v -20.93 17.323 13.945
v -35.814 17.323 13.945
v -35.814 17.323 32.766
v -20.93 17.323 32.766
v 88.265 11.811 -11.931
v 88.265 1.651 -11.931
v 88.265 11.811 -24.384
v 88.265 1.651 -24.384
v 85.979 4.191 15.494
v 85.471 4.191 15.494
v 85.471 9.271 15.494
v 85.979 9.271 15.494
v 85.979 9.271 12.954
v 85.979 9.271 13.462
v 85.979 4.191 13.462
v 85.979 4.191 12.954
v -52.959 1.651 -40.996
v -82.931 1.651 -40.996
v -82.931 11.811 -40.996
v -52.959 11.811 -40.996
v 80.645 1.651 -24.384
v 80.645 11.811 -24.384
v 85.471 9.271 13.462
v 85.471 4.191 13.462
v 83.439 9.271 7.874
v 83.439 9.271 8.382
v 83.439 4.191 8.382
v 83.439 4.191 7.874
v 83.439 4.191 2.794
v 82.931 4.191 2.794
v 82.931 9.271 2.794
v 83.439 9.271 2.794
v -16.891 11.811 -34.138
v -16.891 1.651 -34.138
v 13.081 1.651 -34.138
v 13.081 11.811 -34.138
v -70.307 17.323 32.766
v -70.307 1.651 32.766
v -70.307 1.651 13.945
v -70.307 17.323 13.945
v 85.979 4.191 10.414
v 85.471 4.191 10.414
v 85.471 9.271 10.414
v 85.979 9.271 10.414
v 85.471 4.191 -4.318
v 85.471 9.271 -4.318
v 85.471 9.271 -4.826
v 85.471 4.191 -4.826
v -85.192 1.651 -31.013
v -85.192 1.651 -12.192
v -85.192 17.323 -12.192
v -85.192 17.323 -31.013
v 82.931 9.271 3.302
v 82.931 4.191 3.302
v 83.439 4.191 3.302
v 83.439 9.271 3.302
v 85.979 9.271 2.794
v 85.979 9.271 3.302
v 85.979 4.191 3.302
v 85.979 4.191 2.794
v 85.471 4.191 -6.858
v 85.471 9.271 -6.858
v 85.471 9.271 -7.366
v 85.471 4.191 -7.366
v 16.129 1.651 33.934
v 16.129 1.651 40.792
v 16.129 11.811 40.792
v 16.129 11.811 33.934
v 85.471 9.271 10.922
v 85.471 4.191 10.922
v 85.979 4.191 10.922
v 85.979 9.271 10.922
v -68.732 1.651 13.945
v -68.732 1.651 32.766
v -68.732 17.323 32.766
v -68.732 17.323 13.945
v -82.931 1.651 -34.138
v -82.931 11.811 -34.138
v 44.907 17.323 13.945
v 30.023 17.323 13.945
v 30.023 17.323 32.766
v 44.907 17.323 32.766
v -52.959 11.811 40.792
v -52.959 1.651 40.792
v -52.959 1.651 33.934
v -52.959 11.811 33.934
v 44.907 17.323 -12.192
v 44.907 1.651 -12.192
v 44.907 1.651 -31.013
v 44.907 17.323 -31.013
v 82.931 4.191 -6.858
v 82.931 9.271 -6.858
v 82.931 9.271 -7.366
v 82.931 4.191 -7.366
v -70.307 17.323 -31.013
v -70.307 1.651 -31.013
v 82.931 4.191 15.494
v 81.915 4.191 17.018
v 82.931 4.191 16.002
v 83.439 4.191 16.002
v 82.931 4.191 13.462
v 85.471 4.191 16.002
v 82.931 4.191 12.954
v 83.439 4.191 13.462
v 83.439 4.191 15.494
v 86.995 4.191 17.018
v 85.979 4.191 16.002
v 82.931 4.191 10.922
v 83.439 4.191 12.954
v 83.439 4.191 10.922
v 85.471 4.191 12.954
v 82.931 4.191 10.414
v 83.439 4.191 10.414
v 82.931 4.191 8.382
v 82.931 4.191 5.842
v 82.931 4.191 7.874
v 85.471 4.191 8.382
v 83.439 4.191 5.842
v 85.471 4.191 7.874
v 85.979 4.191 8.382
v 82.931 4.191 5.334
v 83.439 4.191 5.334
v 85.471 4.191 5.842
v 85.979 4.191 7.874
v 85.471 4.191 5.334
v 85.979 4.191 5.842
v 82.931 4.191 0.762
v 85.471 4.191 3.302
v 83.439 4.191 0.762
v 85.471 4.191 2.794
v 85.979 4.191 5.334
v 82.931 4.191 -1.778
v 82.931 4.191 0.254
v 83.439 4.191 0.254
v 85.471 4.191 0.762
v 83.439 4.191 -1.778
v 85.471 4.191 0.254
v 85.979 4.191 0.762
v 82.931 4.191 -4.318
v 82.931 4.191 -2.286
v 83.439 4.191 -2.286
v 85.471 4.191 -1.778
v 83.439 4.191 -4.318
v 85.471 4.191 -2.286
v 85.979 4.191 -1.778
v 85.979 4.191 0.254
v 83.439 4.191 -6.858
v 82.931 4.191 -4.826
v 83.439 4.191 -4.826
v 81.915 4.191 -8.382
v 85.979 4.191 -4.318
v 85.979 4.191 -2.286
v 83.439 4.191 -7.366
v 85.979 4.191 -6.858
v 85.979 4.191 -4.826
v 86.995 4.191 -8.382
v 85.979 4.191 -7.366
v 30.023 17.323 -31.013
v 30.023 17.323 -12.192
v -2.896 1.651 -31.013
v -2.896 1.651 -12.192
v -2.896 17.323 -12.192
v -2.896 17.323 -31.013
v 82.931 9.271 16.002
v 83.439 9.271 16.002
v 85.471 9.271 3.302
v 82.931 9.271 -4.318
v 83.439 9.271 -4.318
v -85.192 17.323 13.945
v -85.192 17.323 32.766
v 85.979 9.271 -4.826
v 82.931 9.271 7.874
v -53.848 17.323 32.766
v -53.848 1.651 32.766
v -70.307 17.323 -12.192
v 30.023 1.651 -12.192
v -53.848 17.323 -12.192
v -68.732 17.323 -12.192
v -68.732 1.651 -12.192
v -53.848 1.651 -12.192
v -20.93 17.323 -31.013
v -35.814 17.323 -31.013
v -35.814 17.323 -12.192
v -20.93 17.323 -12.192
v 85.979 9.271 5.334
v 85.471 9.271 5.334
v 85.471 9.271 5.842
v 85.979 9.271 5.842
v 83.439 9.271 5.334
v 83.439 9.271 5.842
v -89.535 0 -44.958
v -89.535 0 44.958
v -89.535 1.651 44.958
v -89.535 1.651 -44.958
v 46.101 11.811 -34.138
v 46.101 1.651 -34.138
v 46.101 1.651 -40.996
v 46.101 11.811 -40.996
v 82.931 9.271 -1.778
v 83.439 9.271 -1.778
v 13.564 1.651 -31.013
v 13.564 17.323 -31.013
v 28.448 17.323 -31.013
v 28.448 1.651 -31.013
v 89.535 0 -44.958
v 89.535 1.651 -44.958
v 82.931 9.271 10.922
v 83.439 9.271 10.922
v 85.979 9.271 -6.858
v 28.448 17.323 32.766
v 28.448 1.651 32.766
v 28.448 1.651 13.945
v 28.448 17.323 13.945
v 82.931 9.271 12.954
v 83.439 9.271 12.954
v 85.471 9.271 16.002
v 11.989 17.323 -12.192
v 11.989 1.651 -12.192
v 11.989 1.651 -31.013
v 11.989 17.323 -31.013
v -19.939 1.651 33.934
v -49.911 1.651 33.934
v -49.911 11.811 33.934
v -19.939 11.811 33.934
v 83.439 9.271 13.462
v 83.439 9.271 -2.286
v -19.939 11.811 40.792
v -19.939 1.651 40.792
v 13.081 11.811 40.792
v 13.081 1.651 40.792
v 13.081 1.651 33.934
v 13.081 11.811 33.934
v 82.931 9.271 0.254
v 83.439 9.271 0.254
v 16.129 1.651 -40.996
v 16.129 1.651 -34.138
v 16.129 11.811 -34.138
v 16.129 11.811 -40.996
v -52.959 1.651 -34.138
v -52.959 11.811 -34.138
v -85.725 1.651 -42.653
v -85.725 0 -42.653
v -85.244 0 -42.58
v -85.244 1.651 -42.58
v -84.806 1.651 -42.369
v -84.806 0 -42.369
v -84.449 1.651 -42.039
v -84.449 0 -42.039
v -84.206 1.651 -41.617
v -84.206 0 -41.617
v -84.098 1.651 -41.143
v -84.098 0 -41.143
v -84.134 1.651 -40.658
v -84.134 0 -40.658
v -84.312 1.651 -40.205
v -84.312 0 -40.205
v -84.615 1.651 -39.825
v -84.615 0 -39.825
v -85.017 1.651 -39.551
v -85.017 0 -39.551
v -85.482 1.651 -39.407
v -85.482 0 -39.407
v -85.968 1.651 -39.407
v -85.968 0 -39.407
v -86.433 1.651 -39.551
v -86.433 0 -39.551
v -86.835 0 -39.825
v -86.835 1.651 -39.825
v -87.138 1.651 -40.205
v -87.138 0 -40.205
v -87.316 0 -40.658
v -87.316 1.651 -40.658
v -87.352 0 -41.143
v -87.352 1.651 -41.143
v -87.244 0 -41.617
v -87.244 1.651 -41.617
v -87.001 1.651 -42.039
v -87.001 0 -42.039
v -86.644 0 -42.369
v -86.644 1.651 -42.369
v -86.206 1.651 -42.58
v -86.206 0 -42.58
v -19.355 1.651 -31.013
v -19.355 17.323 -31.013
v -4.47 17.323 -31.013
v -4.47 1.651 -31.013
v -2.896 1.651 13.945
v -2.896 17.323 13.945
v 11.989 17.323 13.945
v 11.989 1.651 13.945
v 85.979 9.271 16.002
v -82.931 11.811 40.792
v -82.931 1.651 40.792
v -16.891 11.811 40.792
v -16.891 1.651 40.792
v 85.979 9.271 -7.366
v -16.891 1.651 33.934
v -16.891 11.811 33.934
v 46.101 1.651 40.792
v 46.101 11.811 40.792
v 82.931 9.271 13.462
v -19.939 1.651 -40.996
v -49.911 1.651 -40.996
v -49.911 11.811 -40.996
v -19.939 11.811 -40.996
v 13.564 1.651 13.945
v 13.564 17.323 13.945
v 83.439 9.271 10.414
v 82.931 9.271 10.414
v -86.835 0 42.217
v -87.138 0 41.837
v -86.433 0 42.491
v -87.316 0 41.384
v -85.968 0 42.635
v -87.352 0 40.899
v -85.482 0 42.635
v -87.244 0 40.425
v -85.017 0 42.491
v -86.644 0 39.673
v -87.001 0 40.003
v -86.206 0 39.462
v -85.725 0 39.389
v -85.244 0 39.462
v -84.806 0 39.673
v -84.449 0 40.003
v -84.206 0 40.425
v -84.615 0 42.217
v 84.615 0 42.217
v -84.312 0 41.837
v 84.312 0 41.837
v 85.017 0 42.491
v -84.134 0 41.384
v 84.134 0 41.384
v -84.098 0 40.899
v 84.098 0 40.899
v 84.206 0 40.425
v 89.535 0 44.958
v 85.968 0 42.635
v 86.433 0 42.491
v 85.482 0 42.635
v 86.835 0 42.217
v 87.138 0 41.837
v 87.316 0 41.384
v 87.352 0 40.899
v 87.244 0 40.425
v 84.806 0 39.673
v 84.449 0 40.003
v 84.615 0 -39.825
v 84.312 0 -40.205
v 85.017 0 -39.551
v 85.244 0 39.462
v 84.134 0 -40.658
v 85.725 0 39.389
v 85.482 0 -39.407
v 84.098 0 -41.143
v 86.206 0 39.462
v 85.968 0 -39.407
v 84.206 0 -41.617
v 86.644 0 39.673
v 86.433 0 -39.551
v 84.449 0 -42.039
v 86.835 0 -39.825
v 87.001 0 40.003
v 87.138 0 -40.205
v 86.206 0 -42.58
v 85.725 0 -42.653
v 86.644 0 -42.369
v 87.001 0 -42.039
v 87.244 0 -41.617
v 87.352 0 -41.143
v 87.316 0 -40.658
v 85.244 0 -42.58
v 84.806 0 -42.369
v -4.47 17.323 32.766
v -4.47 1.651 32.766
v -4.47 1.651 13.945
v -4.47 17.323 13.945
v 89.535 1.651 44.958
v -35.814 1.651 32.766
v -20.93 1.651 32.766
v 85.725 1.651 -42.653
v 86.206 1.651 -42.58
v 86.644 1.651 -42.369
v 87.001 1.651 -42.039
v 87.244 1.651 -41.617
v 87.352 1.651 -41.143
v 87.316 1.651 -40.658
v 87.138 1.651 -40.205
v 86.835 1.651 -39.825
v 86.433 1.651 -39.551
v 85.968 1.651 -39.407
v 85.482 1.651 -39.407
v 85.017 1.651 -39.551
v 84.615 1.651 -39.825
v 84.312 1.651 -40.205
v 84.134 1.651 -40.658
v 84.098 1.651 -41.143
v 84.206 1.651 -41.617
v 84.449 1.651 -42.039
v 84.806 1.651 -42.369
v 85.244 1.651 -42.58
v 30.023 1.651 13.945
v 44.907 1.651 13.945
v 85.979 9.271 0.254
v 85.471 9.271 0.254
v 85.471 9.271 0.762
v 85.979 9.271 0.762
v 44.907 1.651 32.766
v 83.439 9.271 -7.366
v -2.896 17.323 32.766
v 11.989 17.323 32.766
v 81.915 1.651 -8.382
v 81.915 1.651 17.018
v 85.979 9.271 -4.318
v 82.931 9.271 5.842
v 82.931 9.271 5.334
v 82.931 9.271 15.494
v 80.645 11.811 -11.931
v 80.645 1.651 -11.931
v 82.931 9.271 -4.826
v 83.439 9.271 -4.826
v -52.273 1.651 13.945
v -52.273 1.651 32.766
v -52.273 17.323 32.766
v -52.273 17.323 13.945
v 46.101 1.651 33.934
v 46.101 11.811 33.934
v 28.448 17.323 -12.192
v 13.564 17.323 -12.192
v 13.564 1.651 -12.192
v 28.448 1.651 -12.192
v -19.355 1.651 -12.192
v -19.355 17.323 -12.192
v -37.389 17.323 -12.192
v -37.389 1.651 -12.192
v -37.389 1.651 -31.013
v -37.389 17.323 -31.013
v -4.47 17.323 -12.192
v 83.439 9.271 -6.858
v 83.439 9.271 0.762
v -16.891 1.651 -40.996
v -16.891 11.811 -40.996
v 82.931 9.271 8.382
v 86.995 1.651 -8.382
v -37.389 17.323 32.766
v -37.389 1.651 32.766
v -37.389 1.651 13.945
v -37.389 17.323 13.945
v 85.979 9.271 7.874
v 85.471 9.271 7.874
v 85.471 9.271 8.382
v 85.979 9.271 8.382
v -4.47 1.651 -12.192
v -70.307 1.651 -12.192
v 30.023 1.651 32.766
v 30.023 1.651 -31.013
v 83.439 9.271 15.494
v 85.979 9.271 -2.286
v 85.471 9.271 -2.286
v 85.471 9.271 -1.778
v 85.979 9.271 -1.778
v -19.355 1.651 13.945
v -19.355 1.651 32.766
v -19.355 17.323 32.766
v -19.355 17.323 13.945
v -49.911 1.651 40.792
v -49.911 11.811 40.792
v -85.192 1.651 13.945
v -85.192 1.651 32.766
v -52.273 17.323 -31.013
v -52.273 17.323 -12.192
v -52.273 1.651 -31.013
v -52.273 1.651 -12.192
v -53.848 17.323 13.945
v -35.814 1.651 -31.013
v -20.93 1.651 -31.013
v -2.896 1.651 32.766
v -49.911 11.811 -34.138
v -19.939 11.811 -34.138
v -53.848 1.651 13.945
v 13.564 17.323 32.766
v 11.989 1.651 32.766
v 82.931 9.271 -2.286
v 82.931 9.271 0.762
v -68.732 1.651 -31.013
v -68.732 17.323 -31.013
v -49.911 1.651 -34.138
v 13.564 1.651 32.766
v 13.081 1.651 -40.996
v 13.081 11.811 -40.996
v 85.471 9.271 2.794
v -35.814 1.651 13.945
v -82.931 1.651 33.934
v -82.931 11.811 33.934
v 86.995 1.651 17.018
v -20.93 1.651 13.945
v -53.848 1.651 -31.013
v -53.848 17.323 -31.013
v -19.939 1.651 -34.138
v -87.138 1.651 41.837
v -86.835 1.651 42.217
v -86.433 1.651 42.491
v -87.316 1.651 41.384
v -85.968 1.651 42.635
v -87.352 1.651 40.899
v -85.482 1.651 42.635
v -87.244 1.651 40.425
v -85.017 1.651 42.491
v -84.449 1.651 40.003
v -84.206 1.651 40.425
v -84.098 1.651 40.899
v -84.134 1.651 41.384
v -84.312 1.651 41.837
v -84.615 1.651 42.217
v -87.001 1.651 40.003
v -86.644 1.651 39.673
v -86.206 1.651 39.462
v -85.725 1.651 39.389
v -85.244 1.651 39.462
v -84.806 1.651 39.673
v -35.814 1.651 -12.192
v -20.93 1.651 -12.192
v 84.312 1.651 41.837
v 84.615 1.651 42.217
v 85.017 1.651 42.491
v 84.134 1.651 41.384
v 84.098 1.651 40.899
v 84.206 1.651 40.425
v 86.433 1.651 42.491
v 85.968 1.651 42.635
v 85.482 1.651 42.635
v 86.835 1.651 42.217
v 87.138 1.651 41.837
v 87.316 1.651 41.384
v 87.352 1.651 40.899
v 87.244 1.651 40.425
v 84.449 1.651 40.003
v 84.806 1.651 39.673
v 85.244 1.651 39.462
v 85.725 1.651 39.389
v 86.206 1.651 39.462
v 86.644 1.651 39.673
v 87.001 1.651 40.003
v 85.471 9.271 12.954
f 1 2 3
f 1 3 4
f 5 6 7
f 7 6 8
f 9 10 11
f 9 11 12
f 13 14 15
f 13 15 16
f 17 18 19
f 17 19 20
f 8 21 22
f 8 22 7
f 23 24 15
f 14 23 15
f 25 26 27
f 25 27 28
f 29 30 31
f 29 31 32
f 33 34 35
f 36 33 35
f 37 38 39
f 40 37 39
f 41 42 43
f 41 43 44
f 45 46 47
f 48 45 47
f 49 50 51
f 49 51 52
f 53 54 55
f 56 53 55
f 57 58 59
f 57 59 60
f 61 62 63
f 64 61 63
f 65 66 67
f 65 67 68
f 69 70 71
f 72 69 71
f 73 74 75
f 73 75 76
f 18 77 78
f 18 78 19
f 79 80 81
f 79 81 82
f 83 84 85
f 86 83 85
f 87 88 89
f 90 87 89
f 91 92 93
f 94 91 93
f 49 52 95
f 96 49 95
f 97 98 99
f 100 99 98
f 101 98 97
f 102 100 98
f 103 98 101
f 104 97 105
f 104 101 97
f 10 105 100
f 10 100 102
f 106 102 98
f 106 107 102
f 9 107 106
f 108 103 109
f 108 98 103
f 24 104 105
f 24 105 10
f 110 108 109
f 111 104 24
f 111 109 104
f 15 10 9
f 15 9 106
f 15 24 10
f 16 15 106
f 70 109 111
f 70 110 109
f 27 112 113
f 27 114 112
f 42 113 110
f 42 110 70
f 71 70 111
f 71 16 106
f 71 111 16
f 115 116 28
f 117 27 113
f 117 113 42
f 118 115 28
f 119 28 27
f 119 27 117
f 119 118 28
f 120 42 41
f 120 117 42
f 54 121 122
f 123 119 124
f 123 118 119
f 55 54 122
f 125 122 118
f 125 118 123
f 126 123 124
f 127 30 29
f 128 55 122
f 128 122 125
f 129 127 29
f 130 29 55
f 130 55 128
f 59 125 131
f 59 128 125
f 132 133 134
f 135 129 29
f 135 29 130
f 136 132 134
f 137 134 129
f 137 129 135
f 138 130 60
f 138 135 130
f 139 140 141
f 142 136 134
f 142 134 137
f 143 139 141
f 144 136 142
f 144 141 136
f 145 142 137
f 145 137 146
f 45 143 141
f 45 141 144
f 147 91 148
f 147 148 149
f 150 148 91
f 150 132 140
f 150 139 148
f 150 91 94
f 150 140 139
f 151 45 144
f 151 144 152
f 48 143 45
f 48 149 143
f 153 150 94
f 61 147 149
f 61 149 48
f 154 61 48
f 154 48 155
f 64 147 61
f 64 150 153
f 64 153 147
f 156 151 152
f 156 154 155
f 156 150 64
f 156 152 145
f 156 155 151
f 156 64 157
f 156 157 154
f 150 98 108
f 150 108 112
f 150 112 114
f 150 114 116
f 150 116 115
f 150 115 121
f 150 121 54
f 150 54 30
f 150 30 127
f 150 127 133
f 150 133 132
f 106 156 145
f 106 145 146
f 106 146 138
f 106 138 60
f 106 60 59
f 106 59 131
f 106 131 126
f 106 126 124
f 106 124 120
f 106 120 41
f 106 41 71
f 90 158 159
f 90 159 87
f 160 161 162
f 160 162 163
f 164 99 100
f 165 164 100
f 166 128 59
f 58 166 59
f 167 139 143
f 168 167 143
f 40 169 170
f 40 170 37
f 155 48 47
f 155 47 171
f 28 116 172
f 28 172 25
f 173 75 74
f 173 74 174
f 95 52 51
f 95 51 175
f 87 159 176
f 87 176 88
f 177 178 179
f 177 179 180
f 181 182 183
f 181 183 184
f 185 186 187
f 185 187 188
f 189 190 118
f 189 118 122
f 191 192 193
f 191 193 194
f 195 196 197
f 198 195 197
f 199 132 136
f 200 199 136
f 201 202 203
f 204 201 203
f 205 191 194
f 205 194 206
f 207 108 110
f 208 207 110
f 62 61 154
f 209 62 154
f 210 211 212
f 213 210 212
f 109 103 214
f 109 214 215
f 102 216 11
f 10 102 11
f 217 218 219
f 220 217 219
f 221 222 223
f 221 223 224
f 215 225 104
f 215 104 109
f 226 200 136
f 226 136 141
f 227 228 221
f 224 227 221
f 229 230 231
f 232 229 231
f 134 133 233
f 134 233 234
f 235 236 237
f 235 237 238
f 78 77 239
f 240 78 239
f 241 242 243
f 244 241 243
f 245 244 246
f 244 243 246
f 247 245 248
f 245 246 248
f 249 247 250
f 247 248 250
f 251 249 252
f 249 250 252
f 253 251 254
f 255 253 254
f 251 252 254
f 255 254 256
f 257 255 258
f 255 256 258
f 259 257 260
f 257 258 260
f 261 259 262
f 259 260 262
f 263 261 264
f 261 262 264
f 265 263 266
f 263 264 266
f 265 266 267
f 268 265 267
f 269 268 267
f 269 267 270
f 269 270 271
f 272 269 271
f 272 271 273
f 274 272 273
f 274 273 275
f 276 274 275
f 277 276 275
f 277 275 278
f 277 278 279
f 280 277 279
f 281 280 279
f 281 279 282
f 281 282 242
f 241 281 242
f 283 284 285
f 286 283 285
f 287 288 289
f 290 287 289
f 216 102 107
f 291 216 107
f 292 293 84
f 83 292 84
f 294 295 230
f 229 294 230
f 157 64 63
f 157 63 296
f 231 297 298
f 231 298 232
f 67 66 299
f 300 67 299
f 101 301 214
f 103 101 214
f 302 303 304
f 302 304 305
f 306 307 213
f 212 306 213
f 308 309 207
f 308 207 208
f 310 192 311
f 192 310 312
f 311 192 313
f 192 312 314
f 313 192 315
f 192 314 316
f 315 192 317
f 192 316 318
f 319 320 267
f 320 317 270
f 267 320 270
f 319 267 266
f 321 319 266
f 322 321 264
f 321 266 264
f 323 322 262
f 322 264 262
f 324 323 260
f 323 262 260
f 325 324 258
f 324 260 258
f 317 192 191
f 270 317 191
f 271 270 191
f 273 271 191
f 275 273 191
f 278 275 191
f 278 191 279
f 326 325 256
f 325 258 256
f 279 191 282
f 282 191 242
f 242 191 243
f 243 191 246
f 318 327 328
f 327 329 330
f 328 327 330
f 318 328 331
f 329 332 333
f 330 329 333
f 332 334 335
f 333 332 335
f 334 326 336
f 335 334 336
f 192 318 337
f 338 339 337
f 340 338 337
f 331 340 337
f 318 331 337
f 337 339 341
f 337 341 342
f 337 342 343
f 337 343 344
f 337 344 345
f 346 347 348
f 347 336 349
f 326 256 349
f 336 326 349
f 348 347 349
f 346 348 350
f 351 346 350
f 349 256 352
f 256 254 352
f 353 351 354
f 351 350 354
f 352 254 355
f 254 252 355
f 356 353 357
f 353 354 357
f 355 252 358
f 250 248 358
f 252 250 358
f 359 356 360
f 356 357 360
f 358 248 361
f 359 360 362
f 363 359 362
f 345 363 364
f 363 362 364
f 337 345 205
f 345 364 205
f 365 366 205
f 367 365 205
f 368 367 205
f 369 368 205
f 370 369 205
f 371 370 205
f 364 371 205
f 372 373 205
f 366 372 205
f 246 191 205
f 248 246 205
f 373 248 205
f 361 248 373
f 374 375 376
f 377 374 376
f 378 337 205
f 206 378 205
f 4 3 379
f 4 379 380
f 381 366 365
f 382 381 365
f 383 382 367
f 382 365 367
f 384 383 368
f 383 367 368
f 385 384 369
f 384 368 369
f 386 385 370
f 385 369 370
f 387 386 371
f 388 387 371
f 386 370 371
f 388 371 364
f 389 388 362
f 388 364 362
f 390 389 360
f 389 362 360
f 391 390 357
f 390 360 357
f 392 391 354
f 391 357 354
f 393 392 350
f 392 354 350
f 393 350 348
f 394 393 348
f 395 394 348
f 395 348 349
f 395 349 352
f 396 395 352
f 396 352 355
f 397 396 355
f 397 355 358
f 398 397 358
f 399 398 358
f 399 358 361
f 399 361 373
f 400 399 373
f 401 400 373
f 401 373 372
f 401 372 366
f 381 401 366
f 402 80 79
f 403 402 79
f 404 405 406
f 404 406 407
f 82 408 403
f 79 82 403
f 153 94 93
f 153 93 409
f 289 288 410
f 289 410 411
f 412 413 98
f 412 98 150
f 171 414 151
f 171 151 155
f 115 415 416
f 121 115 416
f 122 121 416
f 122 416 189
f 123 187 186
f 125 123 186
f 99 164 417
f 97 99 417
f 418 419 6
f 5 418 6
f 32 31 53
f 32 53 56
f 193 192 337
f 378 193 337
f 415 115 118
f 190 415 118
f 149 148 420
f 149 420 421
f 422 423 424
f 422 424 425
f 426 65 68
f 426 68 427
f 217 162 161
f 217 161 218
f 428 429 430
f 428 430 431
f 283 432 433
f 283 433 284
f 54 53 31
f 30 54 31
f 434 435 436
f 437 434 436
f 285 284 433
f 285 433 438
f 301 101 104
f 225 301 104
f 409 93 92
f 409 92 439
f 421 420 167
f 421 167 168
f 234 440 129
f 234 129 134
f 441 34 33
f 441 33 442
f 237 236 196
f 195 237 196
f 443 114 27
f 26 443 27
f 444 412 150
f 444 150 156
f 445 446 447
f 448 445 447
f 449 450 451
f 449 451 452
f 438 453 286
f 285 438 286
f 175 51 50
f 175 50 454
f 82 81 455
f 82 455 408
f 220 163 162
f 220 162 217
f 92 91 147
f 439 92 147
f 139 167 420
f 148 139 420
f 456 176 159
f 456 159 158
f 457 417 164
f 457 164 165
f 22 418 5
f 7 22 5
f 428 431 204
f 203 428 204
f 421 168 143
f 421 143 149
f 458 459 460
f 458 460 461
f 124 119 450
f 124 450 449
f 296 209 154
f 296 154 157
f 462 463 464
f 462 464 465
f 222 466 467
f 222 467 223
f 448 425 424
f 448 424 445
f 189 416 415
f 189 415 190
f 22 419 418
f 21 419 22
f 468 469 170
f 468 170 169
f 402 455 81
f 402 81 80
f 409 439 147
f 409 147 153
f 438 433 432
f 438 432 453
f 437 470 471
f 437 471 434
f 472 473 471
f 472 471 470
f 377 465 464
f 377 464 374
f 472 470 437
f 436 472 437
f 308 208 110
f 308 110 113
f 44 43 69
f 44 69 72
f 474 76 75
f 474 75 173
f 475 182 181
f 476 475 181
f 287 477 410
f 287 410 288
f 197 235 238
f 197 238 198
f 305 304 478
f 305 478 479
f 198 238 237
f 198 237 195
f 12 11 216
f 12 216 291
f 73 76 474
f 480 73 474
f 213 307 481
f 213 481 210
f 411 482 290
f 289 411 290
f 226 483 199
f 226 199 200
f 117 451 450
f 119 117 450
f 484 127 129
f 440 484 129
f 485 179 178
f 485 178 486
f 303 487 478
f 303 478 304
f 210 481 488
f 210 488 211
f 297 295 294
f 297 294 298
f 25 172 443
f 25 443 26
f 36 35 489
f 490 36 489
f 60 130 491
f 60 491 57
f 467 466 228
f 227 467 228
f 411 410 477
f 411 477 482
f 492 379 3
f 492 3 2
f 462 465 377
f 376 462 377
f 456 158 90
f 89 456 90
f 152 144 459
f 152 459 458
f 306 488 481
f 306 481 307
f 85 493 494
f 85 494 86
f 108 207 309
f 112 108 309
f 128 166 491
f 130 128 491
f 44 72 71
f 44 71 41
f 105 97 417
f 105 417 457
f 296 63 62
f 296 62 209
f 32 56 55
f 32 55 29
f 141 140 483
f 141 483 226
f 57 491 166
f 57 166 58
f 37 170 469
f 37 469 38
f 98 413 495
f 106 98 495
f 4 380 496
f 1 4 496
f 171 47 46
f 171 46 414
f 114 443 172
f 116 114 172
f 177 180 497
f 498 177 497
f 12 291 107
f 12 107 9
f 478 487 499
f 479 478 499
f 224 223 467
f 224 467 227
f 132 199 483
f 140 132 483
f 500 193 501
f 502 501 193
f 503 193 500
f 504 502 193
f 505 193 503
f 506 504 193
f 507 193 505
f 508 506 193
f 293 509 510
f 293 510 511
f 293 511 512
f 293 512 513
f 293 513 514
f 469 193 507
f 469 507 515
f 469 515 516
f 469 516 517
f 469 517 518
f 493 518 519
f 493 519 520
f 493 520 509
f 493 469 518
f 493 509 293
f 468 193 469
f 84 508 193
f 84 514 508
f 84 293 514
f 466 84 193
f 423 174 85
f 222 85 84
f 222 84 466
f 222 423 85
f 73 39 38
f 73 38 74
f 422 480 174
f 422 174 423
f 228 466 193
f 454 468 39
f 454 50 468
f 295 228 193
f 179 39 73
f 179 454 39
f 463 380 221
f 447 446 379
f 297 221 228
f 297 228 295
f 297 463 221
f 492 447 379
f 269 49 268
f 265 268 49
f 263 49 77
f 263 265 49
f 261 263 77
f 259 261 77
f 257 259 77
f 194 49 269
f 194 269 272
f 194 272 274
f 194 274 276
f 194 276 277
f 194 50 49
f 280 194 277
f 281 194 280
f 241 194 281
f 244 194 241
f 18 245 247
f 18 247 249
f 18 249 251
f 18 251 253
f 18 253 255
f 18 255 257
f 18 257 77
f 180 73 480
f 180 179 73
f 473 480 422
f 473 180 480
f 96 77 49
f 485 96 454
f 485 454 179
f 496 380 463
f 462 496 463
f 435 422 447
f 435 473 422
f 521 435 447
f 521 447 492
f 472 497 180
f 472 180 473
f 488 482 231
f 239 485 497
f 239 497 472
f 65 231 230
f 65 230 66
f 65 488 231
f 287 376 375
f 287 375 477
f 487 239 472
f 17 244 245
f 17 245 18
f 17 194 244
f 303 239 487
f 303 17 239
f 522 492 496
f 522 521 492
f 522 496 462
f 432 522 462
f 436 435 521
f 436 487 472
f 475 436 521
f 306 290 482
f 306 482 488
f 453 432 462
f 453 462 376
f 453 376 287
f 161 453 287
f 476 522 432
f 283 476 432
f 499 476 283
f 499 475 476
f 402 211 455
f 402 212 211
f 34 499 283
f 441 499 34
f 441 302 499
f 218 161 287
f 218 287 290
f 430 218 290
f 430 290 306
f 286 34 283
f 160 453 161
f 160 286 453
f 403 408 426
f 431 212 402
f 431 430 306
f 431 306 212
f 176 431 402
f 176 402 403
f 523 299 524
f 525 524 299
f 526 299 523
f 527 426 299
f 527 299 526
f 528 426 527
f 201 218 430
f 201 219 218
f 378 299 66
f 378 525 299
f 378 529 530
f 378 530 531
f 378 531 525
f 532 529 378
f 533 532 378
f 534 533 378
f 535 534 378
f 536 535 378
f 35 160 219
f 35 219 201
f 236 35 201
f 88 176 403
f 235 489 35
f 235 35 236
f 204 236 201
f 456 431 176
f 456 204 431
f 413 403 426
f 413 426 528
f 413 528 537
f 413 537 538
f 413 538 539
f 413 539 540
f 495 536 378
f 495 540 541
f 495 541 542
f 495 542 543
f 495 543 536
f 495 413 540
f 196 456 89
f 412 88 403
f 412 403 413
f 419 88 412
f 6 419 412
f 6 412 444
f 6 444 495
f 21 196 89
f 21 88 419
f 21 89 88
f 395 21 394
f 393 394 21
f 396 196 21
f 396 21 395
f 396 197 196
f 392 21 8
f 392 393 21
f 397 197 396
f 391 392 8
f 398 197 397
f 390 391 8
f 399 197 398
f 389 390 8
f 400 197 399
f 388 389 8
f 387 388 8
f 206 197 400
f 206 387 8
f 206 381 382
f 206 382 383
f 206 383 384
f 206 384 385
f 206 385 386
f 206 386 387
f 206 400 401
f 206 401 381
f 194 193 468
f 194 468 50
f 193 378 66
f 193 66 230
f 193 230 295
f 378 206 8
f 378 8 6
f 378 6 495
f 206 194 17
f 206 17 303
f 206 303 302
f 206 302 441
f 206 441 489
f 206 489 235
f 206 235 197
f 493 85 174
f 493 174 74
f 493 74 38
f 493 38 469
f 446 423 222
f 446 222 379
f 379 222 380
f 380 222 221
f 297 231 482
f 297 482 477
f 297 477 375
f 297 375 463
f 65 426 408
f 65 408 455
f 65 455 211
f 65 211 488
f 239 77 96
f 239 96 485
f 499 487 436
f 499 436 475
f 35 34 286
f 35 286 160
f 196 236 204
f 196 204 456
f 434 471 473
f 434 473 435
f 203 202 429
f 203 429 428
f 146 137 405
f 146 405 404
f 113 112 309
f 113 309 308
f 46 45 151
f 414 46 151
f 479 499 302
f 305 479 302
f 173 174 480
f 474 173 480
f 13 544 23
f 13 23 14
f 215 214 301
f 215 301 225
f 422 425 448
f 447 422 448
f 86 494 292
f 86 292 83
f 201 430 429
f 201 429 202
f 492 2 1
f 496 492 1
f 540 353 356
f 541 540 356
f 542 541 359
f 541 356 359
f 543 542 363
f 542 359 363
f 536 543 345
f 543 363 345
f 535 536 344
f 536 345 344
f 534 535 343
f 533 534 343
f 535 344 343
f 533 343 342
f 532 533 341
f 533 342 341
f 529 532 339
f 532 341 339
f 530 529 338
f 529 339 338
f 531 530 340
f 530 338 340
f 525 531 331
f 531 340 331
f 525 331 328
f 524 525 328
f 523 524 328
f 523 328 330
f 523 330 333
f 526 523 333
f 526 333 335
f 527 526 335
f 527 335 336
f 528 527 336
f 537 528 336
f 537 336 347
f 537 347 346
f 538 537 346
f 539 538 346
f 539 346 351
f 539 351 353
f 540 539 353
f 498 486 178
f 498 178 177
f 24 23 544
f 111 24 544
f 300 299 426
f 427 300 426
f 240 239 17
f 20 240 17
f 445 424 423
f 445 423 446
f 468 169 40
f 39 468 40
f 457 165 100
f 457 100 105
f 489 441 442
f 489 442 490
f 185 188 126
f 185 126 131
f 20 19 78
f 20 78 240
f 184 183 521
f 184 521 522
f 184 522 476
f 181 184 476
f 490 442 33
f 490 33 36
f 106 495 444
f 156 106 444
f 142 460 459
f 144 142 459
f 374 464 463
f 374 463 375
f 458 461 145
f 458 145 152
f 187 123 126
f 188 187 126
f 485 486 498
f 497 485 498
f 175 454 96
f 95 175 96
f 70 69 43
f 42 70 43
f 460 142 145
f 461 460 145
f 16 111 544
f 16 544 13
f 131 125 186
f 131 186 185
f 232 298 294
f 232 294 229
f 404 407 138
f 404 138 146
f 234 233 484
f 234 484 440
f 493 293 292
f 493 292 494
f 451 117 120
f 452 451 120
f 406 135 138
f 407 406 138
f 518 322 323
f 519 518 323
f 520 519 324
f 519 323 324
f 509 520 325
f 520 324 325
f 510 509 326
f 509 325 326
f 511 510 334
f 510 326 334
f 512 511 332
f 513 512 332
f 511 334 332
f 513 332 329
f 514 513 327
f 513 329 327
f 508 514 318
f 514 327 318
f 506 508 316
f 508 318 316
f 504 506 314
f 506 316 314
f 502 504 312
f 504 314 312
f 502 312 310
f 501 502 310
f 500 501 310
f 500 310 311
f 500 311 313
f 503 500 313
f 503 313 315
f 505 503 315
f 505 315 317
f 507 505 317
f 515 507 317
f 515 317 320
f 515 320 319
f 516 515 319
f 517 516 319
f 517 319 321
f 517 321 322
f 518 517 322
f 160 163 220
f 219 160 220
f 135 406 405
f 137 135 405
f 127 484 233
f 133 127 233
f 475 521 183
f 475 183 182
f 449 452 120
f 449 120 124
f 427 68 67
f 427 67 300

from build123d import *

# Parameters (mm, degrees)
SKETCH1_W                    = 179.07
SKETCH1_H                    = 89.916
BOSS_EXTRUDE1_DEPTH          = 1.651
F_30_0_1285_DIAMETER_HOLE1_D = 3.2639
SKETCH4_W                    = 14.8844
SKETCH4_H                    = 18.8214
BOSS_EXTRUDE2_DEPTH          = 15.6718
LPATTERN1_COUNT              = 8
LPATTERN1_PITCH              = 16.4592
LPATTERN1_COUNT_DIR2         = 2
LPATTERN1_PITCH_DIR2         = 44.958
SKETCH5_W                    = 29.972
SKETCH5_H                    = 6.858
BOSS_EXTRUDE3_DEPTH          = 10.16
LPATTERN2_COUNT              = 4
LPATTERN2_PITCH              = 33.02
LPATTERN2_COUNT_DIR2         = 2
LPATTERN2_PITCH_DIR2         = 74.93
SKETCH6_W                    = 7.62
SKETCH6_H                    = 12.452922763
BOSS_EXTRUDE4_DEPTH          = 10.16
SKETCH7_W                    = 5.08
SKETCH7_H                    = 25.4
BOSS_EXTRUDE5_DEPTH          = 2.54
SKETCH8_W                    = 0.508
SKETCH8_H                    = 0.508
BOSS_EXTRUDE6_DEPTH          = 5.08
LPATTERN3_COUNT              = 10
LPATTERN3_PITCH              = 2.54
LPATTERN3_COUNT_DIR2         = 2
LPATTERN3_PITCH_DIR2         = 2.54


with BuildPart() as part:
    # Sketch1 → Boss-Extrude1 (new body)
    with BuildSketch(Plane(origin=(0, 0, 0), x_dir=(1, 0, 0), z_dir=(0, 1, 0))):
        Rectangle(SKETCH1_W, SKETCH1_H)
    extrude(amount=BOSS_EXTRUDE1_DEPTH)

    # #30 (0.1285) Diameter Hole1 (through all)
    with Locations(Plane(origin=(-85.725, 1.651, 41.021), x_dir=(0, 0, 1), z_dir=(0, 1, 0))):
        with Locations((0, 0), (-82.042, 0), (-82.042, 171.45), (0, 171.45)):
            Hole(F_30_0_1285_DIAMETER_HOLE1_D / 2)

    # Sketch4 → Boss-Extrude2 (add)
    with BuildSketch(Plane(origin=(0, 1.651, 0), x_dir=(1, 0, 0), z_dir=(0, 1, 0))):
        with Locations((-77.7494, -23.3553)):
            Rectangle(SKETCH4_W, SKETCH4_H)
    boss_extrude2 = extrude(amount=BOSS_EXTRUDE2_DEPTH)

    # LPattern1: Boss-Extrude2 8 × 2
    with Locations(*[(i * LPATTERN1_PITCH, 0, -j * LPATTERN1_PITCH_DIR2) for i in range(LPATTERN1_COUNT) for j in range(LPATTERN1_COUNT_DIR2) if (i, j) != (0, 0)]):
        add(boss_extrude2)

    # Sketch5 → Boss-Extrude3 (add)
    with BuildSketch(Plane(origin=(0, 1.651, 0), x_dir=(1, 0, 0), z_dir=(0, 1, 0))):
        with Locations((-67.945, -37.3634)):
            Rectangle(SKETCH5_W, SKETCH5_H)
    boss_extrude3 = extrude(amount=BOSS_EXTRUDE3_DEPTH)

    # LPattern2: Boss-Extrude3 4 × 2
    with Locations(*[(i * LPATTERN2_PITCH, 0, -j * LPATTERN2_PITCH_DIR2) for i in range(LPATTERN2_COUNT) for j in range(LPATTERN2_COUNT_DIR2) if (i, j) != (0, 0)]):
        add(boss_extrude3)

    # Sketch6 → Boss-Extrude4 (add)
    with BuildSketch(Plane(origin=(0, 1.651, 0), x_dir=(1, 0, 0), z_dir=(0, 1, 0))):
        with Locations((84.455, 18.157538618)):
            Rectangle(SKETCH6_W, SKETCH6_H)
    extrude(amount=BOSS_EXTRUDE4_DEPTH)

    # Sketch7 → Boss-Extrude5 (add)
    with BuildSketch(Plane(origin=(0, 1.651, 0), x_dir=(1, 0, 0), z_dir=(0, 1, 0))):
        with Locations((84.455, -4.318)):
            Rectangle(SKETCH7_W, SKETCH7_H)
    extrude(amount=BOSS_EXTRUDE5_DEPTH)

    # Sketch8 → Boss-Extrude6 (add)
    with BuildSketch(Plane(origin=(0, 4.191, 0), x_dir=(1, 0, 0), z_dir=(0, 1, 0))):
        with Locations((85.725, 7.112)):
            Rectangle(SKETCH8_W, SKETCH8_H)
    boss_extrude6 = extrude(amount=BOSS_EXTRUDE6_DEPTH)

    # LPattern3: Boss-Extrude6 10 × 2
    with Locations(*[(-j * LPATTERN3_PITCH_DIR2, 0, i * LPATTERN3_PITCH) for i in range(LPATTERN3_COUNT) for j in range(LPATTERN3_COUNT_DIR2) if (i, j) != (0, 0)]):
        add(boss_extrude6)


solid = part.part
